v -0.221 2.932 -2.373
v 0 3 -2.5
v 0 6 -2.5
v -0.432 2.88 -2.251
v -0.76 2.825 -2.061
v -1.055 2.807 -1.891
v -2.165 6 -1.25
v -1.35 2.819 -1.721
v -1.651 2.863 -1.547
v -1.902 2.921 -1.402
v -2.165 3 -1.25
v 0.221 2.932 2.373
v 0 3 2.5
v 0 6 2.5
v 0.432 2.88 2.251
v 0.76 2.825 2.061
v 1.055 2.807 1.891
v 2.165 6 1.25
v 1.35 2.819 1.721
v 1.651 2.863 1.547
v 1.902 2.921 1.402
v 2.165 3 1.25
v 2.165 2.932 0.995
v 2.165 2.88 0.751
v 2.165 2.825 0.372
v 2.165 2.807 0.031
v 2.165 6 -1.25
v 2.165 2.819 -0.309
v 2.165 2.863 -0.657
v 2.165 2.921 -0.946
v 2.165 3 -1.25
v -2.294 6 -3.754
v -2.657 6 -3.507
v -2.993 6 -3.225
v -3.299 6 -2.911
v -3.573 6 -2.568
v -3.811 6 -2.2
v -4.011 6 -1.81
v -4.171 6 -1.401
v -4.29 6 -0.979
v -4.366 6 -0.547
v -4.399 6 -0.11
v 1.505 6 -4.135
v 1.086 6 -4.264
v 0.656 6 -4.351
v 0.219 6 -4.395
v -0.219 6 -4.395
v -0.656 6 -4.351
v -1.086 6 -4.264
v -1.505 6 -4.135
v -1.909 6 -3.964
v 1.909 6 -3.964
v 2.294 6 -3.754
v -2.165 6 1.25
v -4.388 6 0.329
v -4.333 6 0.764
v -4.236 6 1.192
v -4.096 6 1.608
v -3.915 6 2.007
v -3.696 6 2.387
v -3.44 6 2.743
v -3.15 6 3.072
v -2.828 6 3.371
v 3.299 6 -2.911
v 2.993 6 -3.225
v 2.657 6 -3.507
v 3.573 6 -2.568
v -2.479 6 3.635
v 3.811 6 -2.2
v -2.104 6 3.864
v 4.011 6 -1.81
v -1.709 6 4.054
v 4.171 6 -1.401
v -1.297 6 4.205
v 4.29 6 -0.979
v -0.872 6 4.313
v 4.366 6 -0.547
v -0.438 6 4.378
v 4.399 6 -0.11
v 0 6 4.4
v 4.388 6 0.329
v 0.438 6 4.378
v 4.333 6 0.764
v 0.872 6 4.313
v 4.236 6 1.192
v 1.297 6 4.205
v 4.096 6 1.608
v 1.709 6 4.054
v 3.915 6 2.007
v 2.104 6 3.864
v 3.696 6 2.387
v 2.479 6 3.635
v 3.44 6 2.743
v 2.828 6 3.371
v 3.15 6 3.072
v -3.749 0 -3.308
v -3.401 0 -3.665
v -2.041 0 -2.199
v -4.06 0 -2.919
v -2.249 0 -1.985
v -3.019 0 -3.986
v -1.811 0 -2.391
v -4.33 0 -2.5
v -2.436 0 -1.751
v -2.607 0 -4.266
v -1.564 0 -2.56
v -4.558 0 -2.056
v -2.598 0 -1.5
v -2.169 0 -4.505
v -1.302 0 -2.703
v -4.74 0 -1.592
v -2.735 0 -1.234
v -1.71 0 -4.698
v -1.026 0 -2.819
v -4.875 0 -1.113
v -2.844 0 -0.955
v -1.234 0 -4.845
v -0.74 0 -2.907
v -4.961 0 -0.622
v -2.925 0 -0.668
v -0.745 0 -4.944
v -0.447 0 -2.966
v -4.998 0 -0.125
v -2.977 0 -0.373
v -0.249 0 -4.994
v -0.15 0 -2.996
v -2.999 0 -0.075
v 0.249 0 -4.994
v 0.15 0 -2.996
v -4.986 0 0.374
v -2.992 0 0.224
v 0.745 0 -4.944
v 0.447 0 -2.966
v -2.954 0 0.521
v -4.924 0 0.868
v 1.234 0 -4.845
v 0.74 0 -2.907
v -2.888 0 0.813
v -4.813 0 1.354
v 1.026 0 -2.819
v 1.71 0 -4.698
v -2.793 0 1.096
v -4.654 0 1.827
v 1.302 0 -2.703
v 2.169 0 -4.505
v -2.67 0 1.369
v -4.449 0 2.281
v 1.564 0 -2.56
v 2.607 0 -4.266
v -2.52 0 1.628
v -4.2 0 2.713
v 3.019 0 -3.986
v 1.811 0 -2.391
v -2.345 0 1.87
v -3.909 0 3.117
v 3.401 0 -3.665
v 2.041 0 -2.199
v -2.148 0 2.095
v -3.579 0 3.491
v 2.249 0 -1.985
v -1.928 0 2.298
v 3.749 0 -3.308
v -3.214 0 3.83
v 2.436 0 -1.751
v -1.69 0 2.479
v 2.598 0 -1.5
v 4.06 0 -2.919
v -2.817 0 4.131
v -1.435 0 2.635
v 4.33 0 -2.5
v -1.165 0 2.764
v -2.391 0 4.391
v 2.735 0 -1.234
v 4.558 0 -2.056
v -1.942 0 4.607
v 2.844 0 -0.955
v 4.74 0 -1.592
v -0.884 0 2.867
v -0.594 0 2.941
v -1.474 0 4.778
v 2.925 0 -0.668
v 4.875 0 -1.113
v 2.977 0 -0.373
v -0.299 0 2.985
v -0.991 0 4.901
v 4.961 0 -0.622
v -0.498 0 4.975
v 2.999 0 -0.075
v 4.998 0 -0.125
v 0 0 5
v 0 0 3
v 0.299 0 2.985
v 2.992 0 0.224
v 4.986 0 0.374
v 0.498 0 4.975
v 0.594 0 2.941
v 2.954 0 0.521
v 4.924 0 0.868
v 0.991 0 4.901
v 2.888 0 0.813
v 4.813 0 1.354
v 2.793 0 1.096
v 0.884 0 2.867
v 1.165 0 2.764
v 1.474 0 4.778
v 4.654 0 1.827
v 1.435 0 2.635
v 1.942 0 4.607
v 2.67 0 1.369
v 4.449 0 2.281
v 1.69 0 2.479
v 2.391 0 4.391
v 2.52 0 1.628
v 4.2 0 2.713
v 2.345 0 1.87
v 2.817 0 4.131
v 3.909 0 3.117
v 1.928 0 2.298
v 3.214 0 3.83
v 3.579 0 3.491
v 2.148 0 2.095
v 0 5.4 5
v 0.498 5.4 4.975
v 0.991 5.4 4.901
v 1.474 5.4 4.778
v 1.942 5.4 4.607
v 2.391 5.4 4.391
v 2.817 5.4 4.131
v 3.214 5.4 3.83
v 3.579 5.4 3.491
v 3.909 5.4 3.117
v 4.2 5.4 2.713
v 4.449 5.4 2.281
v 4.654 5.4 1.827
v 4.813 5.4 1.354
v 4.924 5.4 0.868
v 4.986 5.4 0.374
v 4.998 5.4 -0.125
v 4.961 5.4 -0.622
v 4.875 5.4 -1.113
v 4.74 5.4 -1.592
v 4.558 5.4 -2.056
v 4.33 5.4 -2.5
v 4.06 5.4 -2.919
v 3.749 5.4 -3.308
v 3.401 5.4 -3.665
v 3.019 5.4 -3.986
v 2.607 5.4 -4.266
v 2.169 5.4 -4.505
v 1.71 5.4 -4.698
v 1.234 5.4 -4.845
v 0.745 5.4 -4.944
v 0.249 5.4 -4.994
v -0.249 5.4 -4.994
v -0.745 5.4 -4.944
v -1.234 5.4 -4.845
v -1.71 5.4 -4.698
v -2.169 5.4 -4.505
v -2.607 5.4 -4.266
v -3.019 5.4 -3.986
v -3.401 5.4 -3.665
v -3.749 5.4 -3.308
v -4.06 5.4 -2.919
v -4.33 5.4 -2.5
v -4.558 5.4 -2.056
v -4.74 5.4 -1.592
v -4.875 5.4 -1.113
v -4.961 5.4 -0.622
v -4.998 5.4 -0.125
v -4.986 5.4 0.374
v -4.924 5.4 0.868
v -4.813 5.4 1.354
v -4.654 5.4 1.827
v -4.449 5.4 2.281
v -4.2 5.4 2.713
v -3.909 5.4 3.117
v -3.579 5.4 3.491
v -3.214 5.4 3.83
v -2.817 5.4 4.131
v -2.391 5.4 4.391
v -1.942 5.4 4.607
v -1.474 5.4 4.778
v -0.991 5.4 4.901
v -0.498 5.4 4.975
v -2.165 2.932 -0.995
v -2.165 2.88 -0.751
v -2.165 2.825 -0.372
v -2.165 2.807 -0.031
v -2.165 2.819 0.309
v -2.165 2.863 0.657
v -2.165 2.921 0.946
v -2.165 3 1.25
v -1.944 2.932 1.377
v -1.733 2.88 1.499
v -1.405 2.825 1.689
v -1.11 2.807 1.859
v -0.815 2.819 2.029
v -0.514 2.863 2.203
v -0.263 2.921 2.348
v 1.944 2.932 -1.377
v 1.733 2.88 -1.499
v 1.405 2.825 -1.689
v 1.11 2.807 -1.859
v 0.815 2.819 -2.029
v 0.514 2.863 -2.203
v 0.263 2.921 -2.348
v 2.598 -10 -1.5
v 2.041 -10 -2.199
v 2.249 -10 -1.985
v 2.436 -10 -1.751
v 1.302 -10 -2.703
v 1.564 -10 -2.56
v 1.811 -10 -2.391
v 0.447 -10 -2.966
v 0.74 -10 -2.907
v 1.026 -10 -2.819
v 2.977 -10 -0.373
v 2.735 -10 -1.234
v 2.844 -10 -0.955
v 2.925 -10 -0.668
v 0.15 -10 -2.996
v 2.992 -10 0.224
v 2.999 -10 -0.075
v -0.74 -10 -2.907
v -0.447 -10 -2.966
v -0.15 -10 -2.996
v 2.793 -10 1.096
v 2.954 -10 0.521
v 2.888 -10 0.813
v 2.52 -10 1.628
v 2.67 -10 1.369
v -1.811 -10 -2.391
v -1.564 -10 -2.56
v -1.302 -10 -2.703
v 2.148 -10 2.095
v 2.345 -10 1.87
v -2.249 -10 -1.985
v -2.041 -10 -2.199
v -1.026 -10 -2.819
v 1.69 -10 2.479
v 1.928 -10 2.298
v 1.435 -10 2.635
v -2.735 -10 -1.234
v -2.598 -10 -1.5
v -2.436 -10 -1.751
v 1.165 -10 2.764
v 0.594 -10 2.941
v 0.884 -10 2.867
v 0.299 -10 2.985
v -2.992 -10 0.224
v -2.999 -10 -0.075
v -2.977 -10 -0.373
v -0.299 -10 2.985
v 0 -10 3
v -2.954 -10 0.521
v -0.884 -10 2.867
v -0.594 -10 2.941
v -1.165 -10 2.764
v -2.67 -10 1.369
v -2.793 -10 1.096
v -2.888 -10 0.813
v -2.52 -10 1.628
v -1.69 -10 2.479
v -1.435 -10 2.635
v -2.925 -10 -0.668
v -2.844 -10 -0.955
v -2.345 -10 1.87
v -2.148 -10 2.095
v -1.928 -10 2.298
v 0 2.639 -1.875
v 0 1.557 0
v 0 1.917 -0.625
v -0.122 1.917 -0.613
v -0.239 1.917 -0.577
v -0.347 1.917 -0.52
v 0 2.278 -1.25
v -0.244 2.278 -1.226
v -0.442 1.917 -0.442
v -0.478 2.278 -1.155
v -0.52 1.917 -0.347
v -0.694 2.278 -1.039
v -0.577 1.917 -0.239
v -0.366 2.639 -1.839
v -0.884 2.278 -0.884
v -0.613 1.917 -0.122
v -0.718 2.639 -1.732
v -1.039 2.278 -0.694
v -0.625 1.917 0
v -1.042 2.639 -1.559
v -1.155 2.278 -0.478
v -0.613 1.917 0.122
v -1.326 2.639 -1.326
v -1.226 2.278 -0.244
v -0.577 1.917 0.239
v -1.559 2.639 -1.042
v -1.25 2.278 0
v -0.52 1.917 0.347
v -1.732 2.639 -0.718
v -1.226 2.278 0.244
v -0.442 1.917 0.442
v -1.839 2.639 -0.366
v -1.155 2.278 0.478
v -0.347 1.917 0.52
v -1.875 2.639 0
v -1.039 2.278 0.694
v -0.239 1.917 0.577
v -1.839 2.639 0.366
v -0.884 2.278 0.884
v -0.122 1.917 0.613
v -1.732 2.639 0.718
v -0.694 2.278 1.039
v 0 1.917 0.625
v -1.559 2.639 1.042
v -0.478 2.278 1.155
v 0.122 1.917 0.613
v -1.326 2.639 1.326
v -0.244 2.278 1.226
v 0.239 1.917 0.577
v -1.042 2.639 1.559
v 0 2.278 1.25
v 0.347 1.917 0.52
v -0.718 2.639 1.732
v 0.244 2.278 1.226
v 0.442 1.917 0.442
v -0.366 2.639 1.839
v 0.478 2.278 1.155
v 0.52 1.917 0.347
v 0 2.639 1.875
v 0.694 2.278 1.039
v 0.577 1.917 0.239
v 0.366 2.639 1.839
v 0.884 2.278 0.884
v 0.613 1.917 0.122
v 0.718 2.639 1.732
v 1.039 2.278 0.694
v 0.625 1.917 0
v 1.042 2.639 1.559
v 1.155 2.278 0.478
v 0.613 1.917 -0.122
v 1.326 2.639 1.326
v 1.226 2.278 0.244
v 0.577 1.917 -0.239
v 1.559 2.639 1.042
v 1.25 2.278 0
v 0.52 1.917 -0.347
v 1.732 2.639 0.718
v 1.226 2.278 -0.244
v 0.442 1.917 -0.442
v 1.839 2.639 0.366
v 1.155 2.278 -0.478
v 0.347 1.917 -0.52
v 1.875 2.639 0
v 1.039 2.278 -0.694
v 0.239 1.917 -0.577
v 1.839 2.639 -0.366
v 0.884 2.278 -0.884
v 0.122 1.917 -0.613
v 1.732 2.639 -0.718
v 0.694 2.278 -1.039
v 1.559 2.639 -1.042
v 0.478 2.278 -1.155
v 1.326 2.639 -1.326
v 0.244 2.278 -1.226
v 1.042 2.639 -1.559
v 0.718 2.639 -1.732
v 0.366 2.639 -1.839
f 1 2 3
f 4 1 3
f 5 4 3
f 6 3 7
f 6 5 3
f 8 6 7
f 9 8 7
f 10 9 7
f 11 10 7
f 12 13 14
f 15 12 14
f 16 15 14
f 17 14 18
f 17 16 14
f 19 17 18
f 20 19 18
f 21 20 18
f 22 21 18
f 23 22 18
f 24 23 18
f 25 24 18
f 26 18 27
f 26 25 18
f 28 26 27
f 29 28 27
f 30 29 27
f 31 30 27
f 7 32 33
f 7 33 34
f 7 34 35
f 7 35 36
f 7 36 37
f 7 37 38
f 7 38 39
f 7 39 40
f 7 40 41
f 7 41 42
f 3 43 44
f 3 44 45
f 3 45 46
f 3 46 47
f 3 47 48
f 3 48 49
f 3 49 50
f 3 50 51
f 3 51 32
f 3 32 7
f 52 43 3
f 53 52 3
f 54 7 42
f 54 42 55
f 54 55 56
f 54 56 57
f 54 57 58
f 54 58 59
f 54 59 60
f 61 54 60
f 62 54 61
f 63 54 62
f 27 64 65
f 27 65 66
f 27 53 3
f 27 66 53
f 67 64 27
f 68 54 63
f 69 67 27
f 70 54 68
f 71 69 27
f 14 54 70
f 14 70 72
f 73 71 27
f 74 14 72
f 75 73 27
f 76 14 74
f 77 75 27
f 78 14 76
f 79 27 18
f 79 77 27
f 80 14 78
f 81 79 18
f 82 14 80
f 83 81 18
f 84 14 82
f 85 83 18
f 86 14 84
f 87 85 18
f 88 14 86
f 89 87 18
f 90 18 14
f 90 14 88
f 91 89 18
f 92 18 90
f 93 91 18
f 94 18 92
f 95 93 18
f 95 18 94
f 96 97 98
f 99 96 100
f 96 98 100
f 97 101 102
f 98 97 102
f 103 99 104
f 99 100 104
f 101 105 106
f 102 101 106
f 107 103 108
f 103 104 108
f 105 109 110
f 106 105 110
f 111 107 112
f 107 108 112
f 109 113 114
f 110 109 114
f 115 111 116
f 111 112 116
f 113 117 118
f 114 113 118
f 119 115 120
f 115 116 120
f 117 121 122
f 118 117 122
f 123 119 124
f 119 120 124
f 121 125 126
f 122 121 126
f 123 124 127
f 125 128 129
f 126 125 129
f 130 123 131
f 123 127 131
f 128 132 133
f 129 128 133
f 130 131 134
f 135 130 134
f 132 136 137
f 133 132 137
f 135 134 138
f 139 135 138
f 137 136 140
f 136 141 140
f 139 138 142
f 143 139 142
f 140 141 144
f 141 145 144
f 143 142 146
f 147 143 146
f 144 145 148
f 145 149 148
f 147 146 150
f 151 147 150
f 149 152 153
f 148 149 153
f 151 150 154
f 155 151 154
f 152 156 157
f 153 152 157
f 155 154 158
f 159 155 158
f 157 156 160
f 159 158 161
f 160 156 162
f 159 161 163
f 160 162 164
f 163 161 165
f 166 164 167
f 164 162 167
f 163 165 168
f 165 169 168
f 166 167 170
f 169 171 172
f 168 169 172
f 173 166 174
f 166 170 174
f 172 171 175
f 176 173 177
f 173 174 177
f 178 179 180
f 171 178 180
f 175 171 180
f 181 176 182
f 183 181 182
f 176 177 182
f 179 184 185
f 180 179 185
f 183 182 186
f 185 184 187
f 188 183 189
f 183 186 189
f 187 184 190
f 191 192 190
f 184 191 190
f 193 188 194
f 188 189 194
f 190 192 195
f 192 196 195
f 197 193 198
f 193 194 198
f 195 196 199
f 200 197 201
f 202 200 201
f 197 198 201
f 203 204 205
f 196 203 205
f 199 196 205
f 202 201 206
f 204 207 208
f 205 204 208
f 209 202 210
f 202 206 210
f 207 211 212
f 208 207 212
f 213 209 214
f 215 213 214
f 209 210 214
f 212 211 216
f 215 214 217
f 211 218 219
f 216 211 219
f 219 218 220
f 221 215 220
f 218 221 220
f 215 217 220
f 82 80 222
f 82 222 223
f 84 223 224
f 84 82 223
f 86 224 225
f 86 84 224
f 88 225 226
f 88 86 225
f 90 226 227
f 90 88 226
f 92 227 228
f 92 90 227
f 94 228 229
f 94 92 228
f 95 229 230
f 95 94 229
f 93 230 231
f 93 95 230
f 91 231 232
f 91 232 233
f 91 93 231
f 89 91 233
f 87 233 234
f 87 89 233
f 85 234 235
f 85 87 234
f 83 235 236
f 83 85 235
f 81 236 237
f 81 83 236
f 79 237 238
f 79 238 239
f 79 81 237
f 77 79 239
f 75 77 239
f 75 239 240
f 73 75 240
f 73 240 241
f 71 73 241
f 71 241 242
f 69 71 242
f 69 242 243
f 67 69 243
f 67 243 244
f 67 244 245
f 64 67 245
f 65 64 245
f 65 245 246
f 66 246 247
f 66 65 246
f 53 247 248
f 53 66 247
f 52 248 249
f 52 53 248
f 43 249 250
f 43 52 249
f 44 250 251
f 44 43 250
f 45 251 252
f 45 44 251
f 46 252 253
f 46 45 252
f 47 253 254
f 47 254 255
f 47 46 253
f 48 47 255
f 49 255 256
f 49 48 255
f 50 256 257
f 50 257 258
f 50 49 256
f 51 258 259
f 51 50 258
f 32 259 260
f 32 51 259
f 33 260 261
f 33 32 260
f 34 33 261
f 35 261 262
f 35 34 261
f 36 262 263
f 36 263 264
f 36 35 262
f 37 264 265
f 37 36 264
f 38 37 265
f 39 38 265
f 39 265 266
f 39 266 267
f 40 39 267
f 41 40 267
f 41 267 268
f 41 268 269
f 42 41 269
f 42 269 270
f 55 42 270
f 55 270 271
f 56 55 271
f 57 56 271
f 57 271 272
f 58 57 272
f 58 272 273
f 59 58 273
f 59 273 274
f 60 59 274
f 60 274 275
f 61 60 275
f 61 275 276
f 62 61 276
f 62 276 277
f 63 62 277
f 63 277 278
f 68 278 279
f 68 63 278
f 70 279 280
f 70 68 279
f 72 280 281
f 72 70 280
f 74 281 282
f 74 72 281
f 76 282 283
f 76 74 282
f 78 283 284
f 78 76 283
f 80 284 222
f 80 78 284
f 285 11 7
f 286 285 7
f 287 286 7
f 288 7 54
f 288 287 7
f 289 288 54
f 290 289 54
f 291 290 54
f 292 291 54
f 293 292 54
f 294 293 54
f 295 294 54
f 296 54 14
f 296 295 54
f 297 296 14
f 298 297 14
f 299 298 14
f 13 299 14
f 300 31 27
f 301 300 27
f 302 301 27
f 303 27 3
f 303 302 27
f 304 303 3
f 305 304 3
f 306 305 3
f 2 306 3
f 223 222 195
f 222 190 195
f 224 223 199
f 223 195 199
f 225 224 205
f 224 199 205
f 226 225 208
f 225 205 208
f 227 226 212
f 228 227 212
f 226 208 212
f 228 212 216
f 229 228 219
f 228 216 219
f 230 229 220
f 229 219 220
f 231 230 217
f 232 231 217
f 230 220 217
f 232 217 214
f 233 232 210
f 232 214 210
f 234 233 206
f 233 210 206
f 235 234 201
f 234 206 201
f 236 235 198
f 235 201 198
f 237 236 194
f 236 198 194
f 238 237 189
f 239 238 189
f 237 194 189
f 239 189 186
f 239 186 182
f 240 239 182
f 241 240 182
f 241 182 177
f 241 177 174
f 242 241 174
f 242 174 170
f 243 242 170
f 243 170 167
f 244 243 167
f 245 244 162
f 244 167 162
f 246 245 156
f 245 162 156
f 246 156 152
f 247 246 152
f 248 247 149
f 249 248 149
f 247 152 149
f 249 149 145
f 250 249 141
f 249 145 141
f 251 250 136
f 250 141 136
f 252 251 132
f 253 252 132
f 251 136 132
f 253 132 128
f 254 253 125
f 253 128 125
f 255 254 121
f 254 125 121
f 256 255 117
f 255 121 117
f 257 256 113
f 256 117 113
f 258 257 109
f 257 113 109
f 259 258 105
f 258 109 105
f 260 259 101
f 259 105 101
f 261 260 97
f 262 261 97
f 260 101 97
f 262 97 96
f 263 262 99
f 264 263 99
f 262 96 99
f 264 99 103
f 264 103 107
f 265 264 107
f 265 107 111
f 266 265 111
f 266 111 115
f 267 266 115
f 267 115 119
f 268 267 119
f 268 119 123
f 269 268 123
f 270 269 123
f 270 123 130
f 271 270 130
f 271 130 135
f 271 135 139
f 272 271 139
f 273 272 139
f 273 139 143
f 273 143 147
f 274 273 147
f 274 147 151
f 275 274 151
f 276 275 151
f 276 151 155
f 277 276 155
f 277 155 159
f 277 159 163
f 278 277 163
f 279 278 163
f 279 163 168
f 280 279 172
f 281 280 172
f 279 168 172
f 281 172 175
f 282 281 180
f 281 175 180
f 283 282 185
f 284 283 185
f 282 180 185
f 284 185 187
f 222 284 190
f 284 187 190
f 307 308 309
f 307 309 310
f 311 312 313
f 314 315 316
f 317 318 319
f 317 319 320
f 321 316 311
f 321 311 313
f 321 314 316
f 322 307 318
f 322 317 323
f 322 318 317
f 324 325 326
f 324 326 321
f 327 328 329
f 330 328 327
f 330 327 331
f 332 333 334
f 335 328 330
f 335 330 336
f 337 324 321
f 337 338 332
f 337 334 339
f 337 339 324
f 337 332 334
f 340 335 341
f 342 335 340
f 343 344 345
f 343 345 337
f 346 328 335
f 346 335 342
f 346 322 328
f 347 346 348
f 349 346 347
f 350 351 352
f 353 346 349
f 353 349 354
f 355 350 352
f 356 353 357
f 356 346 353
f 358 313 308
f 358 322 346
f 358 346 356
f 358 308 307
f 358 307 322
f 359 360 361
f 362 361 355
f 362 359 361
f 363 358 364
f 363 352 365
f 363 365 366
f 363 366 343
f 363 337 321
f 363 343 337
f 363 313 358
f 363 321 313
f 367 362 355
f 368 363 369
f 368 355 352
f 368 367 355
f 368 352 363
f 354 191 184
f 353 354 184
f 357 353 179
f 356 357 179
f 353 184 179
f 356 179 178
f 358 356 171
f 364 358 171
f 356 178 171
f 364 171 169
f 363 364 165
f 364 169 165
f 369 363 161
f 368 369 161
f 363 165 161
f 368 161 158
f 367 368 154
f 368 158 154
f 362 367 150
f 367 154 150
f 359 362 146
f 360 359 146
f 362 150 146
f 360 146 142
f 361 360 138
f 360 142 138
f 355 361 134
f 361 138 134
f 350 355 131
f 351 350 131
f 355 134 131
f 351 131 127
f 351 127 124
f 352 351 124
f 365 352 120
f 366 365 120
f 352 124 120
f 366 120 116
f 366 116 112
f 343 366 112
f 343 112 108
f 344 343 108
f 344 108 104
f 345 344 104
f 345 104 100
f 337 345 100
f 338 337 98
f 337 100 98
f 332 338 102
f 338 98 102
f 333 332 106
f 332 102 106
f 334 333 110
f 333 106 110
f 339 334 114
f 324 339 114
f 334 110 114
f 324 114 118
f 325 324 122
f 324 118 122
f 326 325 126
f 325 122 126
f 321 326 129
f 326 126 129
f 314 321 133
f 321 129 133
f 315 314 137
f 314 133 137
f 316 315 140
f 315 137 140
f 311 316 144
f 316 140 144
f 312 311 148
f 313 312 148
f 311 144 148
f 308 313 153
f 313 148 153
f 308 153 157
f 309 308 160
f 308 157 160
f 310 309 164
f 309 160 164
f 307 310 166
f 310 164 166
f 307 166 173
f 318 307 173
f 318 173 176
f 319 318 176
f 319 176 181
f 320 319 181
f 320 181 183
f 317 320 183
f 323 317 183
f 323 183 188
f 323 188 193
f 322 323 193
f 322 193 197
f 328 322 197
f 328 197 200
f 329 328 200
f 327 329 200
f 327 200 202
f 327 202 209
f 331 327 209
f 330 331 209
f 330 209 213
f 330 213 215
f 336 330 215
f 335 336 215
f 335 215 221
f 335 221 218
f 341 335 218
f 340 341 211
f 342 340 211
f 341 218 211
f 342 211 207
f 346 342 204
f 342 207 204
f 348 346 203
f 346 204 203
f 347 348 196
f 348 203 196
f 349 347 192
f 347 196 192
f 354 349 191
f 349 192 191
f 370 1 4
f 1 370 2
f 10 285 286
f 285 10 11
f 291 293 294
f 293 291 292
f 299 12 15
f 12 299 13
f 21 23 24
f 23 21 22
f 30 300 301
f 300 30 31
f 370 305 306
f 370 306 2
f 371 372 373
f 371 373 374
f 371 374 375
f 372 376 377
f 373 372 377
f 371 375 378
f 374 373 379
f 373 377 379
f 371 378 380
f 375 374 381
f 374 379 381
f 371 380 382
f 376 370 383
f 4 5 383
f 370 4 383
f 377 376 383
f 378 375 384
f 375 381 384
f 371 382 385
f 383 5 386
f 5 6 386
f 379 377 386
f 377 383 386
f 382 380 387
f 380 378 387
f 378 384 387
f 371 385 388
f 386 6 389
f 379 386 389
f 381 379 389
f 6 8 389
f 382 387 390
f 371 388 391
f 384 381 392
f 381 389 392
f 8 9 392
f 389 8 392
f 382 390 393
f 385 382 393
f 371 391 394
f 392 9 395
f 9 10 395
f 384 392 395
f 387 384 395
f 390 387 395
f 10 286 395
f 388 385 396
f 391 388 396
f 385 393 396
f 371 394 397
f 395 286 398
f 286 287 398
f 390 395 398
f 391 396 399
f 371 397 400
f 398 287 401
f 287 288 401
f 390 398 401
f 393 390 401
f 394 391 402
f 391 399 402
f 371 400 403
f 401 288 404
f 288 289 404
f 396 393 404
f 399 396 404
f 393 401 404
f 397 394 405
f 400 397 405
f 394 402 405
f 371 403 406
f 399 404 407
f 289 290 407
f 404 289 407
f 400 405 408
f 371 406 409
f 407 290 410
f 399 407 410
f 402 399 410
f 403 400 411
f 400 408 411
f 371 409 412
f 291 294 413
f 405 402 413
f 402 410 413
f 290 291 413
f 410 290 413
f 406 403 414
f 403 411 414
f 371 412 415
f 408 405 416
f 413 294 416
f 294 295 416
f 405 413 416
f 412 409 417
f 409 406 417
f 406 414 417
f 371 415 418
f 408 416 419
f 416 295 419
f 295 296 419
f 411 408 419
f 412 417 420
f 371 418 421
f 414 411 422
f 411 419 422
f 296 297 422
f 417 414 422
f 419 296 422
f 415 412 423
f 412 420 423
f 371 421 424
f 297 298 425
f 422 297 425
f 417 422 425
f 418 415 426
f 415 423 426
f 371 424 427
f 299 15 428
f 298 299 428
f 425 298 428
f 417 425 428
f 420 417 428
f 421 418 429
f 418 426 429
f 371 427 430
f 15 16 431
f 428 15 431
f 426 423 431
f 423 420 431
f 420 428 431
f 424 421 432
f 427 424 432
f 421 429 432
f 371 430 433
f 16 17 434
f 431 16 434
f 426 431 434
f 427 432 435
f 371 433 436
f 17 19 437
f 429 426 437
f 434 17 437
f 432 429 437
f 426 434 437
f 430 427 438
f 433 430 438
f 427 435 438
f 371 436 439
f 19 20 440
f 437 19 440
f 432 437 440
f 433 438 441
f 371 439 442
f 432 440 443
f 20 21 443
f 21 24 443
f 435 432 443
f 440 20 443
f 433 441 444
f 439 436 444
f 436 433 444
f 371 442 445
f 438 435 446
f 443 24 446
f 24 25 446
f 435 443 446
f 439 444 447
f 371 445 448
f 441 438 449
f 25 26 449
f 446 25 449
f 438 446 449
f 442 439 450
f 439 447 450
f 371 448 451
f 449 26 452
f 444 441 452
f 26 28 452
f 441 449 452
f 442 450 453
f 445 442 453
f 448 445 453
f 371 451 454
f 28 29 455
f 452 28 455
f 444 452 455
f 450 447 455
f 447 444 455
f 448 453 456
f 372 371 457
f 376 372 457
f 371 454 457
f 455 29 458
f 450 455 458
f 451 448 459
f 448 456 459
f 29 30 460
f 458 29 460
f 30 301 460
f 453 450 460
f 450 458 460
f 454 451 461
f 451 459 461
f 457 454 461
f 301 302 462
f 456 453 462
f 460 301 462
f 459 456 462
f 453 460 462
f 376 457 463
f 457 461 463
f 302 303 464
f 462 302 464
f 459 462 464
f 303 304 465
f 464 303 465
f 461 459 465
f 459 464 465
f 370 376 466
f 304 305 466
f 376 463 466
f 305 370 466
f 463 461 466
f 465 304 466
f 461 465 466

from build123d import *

# Parameters (mm, degrees)
CROQUIS4_R              = 5
SALIENTE_EXTRUIR3_DEPTH = 6
CHAFL_N2_SIZE           = 0.6
CROQUIS6_5_R            = 3
SALIENTE_EXTRUIR7_DEPTH = 10


with BuildPart() as part:
    # Croquis4 → Saliente-Extruir3 (new body)
    with BuildSketch(Plane(origin=(0, 0, 0), x_dir=(1, 0, 0), z_dir=(0, 1, 0))):
        Circle(CROQUIS4_R)
        Polygon((0, 2.5), (-2.165063509, 1.25), (-2.165063509, -1.25), (0, -2.5), (2.165063509, -1.25), (2.165063509, 1.25), align=None, mode=Mode.SUBTRACT)
    extrude(amount=SALIENTE_EXTRUIR3_DEPTH)

    # Chaflán2
    chafl_n2_edges = [part.edges().sort_by_distance(p)[0] for p in [
        (-5, 6, 0),
    ]]
    chamfer(chafl_n2_edges, length=CHAFL_N2_SIZE)

    # Croquis5 → Revolución2 (revolve)
    with BuildSketch(Plane.XY):
        Polygon((0, 0), (0, 1.556624327), (2.5, 3), (5, 3), (5, 0), align=None)
    revolve(axis=Axis((0, 0, 0), (0, 1, 0)))

    # Croquis6<5> → Saliente-Extruir7 (add)
    with BuildSketch(Plane.XZ):
        Circle(CROQUIS6_5_R)
    extrude(amount=SALIENTE_EXTRUIR7_DEPTH)


solid = part.part
